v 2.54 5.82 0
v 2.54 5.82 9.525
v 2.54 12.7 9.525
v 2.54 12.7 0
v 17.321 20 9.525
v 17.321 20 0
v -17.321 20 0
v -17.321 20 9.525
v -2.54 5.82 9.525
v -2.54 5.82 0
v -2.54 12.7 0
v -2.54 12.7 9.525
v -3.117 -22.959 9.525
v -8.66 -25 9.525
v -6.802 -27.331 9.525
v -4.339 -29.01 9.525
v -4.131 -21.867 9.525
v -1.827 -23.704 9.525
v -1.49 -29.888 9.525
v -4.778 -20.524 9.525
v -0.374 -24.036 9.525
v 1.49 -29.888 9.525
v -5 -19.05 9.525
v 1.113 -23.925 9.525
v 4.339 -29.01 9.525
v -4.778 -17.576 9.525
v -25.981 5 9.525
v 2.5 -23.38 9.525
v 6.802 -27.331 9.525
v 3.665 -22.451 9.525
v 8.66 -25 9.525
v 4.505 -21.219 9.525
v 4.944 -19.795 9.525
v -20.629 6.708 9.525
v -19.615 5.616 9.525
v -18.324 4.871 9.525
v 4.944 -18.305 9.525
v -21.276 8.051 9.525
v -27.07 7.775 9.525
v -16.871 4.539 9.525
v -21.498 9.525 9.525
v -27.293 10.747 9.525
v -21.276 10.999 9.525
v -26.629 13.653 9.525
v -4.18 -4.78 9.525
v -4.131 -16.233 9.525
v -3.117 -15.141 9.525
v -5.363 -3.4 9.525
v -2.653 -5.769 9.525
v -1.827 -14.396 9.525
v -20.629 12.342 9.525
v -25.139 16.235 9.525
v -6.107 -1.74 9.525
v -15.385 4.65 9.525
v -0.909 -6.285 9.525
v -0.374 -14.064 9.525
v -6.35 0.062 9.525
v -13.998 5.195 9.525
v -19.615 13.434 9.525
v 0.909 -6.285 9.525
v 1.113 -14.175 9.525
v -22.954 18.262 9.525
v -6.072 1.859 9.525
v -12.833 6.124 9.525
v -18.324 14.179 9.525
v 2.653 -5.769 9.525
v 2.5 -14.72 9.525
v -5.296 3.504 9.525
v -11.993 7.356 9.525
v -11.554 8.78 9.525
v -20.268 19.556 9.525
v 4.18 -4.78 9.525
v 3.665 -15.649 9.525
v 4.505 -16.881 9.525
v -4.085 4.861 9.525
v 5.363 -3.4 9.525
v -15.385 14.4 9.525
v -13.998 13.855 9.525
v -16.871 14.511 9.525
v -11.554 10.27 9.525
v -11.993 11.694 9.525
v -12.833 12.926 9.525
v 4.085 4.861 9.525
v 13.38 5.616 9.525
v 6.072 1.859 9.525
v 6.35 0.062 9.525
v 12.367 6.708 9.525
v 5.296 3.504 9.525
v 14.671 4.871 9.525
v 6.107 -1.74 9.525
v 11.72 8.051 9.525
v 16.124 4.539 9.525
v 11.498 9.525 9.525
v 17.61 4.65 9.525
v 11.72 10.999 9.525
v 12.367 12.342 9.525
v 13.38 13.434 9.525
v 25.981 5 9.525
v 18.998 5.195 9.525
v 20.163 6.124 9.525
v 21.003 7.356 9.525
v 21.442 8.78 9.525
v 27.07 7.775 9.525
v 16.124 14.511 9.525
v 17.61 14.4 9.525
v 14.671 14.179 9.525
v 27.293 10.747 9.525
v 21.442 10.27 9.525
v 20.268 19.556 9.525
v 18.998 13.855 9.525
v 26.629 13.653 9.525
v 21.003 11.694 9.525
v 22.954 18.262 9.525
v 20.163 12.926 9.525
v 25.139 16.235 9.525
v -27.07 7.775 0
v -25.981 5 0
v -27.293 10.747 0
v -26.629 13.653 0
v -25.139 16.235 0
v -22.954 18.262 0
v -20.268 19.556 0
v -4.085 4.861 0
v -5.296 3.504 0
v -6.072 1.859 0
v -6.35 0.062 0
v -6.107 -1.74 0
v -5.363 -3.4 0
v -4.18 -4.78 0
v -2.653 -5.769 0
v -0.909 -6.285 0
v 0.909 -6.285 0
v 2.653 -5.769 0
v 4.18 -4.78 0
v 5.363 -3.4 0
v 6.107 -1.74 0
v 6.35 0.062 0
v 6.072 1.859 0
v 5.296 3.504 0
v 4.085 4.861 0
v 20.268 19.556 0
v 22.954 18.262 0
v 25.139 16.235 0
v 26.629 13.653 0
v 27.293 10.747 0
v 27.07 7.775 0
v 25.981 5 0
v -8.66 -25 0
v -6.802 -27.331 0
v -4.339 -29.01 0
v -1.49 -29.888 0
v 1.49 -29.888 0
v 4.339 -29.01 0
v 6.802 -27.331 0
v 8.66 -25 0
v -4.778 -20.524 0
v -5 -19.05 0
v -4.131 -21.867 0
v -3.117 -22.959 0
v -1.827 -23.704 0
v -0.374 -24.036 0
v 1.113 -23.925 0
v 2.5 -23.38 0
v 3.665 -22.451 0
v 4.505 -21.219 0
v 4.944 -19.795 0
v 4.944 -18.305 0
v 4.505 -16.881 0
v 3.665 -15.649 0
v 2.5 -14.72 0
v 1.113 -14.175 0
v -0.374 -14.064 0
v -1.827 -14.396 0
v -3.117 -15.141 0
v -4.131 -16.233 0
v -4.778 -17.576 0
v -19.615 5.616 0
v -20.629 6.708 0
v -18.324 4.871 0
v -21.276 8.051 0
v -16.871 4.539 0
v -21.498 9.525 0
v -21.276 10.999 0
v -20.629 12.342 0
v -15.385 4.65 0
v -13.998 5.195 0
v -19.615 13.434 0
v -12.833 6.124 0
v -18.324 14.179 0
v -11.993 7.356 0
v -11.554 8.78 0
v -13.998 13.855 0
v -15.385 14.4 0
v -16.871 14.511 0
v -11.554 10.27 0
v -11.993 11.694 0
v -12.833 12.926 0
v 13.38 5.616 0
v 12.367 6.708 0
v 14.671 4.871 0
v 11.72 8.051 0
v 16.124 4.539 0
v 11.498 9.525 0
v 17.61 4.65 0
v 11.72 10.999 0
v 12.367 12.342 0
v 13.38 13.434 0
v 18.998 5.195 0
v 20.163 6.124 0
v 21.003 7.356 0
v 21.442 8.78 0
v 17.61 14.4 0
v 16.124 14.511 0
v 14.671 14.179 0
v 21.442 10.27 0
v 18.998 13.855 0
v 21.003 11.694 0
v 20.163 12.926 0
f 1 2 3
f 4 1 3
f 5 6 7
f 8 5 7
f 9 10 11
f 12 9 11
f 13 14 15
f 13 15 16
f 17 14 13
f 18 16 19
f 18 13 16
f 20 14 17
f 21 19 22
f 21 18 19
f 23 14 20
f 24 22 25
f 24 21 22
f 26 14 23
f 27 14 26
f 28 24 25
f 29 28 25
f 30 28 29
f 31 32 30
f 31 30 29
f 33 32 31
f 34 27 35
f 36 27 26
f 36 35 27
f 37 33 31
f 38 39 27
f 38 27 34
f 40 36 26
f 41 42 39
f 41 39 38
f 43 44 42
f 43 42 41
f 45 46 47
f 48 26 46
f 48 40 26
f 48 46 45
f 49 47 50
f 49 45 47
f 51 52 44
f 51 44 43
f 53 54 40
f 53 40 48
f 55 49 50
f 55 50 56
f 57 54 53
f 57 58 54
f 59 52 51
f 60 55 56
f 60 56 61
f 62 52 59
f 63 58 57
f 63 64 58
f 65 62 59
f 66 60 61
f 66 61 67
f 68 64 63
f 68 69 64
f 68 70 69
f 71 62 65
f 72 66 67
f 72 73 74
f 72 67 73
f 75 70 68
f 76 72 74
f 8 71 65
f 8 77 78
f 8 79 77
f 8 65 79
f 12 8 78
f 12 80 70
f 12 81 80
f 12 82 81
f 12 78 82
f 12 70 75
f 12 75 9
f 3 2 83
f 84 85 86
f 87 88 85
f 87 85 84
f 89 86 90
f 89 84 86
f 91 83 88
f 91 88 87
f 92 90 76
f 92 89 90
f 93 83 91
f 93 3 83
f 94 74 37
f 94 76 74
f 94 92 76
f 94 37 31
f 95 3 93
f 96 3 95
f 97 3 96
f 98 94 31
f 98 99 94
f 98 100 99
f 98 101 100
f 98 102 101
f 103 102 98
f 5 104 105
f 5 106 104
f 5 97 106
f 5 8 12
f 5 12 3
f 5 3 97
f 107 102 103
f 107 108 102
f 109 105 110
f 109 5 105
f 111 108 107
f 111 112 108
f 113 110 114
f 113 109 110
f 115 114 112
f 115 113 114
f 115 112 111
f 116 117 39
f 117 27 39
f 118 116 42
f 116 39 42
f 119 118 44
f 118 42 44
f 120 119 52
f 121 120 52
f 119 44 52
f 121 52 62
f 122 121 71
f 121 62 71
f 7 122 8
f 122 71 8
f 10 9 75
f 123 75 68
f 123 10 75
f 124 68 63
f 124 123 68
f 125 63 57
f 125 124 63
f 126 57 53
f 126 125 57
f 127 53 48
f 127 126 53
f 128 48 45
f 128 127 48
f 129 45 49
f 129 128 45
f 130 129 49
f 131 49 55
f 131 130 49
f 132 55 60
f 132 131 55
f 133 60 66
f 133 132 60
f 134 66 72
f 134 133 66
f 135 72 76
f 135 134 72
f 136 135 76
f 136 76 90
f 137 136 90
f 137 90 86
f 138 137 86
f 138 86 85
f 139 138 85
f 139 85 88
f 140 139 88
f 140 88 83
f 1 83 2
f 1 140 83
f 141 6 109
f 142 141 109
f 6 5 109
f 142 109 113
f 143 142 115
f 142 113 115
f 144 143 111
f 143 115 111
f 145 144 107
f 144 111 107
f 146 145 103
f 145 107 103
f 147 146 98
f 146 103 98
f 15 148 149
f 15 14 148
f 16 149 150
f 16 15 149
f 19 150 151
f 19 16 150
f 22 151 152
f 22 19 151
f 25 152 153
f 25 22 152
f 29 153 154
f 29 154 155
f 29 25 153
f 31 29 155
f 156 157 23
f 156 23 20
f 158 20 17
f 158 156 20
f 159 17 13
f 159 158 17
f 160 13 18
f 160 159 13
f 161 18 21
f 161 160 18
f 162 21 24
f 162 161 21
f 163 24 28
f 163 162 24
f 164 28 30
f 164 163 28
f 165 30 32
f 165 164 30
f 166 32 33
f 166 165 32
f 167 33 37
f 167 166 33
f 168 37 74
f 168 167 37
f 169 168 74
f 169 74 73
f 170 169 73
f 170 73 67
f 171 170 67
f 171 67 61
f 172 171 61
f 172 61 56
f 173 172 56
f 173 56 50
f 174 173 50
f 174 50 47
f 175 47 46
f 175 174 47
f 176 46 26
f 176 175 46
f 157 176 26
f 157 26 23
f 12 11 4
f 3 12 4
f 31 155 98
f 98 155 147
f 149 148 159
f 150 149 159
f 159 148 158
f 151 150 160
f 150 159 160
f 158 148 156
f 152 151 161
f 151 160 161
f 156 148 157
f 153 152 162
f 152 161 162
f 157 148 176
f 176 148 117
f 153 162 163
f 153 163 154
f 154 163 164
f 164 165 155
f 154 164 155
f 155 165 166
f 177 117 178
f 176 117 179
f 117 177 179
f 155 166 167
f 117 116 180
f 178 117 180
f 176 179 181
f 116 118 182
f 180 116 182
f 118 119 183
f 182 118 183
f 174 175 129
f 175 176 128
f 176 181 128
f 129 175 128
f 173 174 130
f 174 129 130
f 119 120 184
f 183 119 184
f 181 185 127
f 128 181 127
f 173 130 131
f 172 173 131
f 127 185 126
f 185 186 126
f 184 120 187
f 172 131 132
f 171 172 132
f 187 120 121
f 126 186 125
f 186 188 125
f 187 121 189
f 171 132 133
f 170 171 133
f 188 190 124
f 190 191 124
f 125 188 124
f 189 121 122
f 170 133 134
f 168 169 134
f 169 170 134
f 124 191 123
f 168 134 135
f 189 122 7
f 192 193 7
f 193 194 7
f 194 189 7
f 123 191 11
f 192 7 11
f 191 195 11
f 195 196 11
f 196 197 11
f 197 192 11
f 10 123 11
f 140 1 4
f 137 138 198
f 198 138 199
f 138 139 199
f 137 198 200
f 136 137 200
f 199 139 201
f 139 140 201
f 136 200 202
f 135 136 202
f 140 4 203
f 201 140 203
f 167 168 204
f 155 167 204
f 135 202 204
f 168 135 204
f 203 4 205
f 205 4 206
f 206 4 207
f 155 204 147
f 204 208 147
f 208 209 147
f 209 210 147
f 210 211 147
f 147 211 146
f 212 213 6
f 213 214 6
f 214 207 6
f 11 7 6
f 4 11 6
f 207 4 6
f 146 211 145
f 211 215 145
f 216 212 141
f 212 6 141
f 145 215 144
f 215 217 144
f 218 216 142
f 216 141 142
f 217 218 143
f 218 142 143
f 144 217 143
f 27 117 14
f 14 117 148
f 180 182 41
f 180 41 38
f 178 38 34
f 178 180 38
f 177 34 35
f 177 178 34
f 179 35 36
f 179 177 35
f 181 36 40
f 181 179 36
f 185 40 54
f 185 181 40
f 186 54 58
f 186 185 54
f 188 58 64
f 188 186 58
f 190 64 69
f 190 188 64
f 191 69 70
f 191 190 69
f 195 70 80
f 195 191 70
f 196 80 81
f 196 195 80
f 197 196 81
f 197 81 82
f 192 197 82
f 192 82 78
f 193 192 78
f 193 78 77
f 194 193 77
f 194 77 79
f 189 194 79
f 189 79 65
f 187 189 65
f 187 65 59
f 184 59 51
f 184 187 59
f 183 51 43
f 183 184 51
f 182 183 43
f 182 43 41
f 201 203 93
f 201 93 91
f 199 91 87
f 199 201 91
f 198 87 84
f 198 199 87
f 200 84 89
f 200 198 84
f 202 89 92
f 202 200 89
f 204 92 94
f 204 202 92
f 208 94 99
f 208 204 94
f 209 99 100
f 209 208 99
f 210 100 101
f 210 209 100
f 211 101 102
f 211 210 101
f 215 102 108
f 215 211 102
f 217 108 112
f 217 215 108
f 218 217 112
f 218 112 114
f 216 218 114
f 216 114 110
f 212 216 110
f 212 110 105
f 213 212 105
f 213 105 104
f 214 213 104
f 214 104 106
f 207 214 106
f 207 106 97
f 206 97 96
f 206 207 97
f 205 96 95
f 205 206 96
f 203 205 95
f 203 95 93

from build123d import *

# Parameters (mm, degrees)
SKETCH2_R           = 6.35
SKETCH2_R_2         = 5
BOSS_EXTRUDE1_DEPTH = 9.525
FILLET1_R           = 10
SKETCH3_W           = 5.08
SKETCH3_H           = 12.7
CUT_EXTRUDE1_DEPTH  = 42.678960958


with BuildPart() as part:
    # Sketch2 → Boss-Extrude1 (new body)
    with BuildSketch(Plane.XY):
        Polygon((-34.641016151, 20), (0, -40), (34.641016151, 20), align=None)
        with Locations(Location((0, 0, 0), (0, 0, 180))):
            Circle(SKETCH2_R, mode=Mode.SUBTRACT)
        with Locations(Location((-16.497783942, 9.525, 0), (0, 0, 180))):
            Circle(SKETCH2_R_2, mode=Mode.SUBTRACT)
        with Locations(Location((16.497783942, 9.525, 0), (0, 0, 180))):
            Circle(SKETCH2_R_2, mode=Mode.SUBTRACT)
        with Locations(Location((0, -19.05, 0), (0, 0, 180))):
            Circle(SKETCH2_R_2, mode=Mode.SUBTRACT)
    extrude(amount=BOSS_EXTRUDE1_DEPTH)

    # Fillet1
    fillet1_edges = [part.edges().sort_by_distance(p)[0] for p in [
        (34.641016151, 20, 4.7625),
        (0, -40, 4.7625),
        (-34.641016151, 20, 4.7625),
    ]]
    fillet(fillet1_edges, radius=FILLET1_R)

    # Sketch3 → Cut-Extrude1 (cut, through all)
    with BuildSketch(Plane.XY):
        with Locations((0, 6.35)):
            Rectangle(SKETCH3_W, SKETCH3_H)
    extrude(amount=CUT_EXTRUDE1_DEPTH, mode=Mode.SUBTRACT)


solid = part.part
